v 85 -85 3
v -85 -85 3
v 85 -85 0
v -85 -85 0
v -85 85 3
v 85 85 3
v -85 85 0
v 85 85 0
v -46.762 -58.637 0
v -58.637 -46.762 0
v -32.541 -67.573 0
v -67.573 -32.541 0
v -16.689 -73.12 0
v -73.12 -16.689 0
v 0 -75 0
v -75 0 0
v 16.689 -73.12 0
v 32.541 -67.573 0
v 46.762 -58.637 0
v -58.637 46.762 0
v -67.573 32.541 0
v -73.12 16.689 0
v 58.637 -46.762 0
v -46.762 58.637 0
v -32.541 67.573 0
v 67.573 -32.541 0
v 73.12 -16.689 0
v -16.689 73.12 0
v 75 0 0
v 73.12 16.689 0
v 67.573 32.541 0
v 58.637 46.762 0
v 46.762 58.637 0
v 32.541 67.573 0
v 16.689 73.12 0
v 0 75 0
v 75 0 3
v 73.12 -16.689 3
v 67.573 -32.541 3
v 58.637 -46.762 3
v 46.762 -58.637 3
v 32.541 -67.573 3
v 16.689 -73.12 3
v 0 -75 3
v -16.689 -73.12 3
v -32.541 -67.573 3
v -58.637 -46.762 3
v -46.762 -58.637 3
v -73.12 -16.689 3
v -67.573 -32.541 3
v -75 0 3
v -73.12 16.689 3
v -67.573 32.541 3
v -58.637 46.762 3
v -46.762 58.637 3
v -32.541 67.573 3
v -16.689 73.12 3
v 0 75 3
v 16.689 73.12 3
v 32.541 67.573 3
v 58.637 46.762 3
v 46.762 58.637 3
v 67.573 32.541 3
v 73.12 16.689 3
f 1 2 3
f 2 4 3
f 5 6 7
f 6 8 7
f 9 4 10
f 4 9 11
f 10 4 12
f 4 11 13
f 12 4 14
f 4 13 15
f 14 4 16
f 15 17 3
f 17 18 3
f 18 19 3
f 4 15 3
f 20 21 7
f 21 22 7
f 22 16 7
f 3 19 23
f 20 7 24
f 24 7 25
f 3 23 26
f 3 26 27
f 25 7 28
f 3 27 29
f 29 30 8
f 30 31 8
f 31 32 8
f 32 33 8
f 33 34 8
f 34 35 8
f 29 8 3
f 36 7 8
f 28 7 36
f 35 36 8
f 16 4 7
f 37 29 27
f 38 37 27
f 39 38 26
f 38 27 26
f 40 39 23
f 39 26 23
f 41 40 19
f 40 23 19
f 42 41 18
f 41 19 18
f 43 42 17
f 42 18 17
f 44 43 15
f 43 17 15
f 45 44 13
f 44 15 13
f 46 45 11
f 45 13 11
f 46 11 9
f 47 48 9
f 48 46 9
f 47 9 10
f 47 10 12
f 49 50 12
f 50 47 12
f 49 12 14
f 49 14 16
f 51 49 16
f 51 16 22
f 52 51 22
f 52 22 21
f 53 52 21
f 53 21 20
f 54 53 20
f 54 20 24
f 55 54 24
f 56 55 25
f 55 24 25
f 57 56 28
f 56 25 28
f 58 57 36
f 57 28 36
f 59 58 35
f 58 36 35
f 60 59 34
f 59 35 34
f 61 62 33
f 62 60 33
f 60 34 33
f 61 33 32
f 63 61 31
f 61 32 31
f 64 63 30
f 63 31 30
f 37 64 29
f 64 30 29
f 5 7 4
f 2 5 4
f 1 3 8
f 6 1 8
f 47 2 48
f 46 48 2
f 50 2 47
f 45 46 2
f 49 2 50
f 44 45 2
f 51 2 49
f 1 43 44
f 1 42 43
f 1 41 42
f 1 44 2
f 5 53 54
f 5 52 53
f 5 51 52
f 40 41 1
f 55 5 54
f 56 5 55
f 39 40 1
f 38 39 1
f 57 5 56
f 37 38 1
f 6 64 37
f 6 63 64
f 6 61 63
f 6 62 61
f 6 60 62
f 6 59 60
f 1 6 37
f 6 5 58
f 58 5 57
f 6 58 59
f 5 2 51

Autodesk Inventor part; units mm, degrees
ref_plane "YZ Plane" through (0, 0, 0) normal (1, 0, 0) x (0, 1, 0)
ref_plane "XZ Plane" through (0, 0, 0) normal (0, 1, 0) x (-1, 0, 0)
ref_plane "XY Plane" through (0, 0, 0) normal (0, 0, 1) x (1, 0, 0)
sketch "Sketch1" plane through (0, 0, 0) normal (0, 0, 1) x (1, 0, 0)
  line L0 (-85, -85) -> (85, -85)
  line L1 (85, -85) -> (85, 85)
  line L2 (85, 85) -> (-85, 85)
  line L3 (-85, 85) -> (-85, -85)
  line L4 (-85, -85) -> (85, 85) construction
  line L5 (85, -85) -> (-85, 85) construction
  circle A0 centre (0, 0) radius 75
  dimension "d0" = 170
  dimension "d1" = 170
  dimension "d22" = 150
extrude "Plate1" add sketch "Sketch1" along normal blind 3
equation "\"d1\" = d0"
equation "\"d2\" = Thickness"
equation "\"BendReliefWidth\" = Thickness"
equation "\"BendReliefDepth\" = 0.5 * Thickness"
equation "\"CornerReliefSize\" = 4 * Thickness"
equation "\"MinimumRemnant\" = 2 * Thickness"
equation "\"TransitionRadius\" = BendRadius"
equation "\"JacobiRadiusSize\" = BendRadius"
equation "\"GapSize\" = Thickness"
equation "\"Thickness\" = 3"
equation "\"BendRadius\" = 5"
properties part number "drain bottom plate" material "Stainless Steel"
